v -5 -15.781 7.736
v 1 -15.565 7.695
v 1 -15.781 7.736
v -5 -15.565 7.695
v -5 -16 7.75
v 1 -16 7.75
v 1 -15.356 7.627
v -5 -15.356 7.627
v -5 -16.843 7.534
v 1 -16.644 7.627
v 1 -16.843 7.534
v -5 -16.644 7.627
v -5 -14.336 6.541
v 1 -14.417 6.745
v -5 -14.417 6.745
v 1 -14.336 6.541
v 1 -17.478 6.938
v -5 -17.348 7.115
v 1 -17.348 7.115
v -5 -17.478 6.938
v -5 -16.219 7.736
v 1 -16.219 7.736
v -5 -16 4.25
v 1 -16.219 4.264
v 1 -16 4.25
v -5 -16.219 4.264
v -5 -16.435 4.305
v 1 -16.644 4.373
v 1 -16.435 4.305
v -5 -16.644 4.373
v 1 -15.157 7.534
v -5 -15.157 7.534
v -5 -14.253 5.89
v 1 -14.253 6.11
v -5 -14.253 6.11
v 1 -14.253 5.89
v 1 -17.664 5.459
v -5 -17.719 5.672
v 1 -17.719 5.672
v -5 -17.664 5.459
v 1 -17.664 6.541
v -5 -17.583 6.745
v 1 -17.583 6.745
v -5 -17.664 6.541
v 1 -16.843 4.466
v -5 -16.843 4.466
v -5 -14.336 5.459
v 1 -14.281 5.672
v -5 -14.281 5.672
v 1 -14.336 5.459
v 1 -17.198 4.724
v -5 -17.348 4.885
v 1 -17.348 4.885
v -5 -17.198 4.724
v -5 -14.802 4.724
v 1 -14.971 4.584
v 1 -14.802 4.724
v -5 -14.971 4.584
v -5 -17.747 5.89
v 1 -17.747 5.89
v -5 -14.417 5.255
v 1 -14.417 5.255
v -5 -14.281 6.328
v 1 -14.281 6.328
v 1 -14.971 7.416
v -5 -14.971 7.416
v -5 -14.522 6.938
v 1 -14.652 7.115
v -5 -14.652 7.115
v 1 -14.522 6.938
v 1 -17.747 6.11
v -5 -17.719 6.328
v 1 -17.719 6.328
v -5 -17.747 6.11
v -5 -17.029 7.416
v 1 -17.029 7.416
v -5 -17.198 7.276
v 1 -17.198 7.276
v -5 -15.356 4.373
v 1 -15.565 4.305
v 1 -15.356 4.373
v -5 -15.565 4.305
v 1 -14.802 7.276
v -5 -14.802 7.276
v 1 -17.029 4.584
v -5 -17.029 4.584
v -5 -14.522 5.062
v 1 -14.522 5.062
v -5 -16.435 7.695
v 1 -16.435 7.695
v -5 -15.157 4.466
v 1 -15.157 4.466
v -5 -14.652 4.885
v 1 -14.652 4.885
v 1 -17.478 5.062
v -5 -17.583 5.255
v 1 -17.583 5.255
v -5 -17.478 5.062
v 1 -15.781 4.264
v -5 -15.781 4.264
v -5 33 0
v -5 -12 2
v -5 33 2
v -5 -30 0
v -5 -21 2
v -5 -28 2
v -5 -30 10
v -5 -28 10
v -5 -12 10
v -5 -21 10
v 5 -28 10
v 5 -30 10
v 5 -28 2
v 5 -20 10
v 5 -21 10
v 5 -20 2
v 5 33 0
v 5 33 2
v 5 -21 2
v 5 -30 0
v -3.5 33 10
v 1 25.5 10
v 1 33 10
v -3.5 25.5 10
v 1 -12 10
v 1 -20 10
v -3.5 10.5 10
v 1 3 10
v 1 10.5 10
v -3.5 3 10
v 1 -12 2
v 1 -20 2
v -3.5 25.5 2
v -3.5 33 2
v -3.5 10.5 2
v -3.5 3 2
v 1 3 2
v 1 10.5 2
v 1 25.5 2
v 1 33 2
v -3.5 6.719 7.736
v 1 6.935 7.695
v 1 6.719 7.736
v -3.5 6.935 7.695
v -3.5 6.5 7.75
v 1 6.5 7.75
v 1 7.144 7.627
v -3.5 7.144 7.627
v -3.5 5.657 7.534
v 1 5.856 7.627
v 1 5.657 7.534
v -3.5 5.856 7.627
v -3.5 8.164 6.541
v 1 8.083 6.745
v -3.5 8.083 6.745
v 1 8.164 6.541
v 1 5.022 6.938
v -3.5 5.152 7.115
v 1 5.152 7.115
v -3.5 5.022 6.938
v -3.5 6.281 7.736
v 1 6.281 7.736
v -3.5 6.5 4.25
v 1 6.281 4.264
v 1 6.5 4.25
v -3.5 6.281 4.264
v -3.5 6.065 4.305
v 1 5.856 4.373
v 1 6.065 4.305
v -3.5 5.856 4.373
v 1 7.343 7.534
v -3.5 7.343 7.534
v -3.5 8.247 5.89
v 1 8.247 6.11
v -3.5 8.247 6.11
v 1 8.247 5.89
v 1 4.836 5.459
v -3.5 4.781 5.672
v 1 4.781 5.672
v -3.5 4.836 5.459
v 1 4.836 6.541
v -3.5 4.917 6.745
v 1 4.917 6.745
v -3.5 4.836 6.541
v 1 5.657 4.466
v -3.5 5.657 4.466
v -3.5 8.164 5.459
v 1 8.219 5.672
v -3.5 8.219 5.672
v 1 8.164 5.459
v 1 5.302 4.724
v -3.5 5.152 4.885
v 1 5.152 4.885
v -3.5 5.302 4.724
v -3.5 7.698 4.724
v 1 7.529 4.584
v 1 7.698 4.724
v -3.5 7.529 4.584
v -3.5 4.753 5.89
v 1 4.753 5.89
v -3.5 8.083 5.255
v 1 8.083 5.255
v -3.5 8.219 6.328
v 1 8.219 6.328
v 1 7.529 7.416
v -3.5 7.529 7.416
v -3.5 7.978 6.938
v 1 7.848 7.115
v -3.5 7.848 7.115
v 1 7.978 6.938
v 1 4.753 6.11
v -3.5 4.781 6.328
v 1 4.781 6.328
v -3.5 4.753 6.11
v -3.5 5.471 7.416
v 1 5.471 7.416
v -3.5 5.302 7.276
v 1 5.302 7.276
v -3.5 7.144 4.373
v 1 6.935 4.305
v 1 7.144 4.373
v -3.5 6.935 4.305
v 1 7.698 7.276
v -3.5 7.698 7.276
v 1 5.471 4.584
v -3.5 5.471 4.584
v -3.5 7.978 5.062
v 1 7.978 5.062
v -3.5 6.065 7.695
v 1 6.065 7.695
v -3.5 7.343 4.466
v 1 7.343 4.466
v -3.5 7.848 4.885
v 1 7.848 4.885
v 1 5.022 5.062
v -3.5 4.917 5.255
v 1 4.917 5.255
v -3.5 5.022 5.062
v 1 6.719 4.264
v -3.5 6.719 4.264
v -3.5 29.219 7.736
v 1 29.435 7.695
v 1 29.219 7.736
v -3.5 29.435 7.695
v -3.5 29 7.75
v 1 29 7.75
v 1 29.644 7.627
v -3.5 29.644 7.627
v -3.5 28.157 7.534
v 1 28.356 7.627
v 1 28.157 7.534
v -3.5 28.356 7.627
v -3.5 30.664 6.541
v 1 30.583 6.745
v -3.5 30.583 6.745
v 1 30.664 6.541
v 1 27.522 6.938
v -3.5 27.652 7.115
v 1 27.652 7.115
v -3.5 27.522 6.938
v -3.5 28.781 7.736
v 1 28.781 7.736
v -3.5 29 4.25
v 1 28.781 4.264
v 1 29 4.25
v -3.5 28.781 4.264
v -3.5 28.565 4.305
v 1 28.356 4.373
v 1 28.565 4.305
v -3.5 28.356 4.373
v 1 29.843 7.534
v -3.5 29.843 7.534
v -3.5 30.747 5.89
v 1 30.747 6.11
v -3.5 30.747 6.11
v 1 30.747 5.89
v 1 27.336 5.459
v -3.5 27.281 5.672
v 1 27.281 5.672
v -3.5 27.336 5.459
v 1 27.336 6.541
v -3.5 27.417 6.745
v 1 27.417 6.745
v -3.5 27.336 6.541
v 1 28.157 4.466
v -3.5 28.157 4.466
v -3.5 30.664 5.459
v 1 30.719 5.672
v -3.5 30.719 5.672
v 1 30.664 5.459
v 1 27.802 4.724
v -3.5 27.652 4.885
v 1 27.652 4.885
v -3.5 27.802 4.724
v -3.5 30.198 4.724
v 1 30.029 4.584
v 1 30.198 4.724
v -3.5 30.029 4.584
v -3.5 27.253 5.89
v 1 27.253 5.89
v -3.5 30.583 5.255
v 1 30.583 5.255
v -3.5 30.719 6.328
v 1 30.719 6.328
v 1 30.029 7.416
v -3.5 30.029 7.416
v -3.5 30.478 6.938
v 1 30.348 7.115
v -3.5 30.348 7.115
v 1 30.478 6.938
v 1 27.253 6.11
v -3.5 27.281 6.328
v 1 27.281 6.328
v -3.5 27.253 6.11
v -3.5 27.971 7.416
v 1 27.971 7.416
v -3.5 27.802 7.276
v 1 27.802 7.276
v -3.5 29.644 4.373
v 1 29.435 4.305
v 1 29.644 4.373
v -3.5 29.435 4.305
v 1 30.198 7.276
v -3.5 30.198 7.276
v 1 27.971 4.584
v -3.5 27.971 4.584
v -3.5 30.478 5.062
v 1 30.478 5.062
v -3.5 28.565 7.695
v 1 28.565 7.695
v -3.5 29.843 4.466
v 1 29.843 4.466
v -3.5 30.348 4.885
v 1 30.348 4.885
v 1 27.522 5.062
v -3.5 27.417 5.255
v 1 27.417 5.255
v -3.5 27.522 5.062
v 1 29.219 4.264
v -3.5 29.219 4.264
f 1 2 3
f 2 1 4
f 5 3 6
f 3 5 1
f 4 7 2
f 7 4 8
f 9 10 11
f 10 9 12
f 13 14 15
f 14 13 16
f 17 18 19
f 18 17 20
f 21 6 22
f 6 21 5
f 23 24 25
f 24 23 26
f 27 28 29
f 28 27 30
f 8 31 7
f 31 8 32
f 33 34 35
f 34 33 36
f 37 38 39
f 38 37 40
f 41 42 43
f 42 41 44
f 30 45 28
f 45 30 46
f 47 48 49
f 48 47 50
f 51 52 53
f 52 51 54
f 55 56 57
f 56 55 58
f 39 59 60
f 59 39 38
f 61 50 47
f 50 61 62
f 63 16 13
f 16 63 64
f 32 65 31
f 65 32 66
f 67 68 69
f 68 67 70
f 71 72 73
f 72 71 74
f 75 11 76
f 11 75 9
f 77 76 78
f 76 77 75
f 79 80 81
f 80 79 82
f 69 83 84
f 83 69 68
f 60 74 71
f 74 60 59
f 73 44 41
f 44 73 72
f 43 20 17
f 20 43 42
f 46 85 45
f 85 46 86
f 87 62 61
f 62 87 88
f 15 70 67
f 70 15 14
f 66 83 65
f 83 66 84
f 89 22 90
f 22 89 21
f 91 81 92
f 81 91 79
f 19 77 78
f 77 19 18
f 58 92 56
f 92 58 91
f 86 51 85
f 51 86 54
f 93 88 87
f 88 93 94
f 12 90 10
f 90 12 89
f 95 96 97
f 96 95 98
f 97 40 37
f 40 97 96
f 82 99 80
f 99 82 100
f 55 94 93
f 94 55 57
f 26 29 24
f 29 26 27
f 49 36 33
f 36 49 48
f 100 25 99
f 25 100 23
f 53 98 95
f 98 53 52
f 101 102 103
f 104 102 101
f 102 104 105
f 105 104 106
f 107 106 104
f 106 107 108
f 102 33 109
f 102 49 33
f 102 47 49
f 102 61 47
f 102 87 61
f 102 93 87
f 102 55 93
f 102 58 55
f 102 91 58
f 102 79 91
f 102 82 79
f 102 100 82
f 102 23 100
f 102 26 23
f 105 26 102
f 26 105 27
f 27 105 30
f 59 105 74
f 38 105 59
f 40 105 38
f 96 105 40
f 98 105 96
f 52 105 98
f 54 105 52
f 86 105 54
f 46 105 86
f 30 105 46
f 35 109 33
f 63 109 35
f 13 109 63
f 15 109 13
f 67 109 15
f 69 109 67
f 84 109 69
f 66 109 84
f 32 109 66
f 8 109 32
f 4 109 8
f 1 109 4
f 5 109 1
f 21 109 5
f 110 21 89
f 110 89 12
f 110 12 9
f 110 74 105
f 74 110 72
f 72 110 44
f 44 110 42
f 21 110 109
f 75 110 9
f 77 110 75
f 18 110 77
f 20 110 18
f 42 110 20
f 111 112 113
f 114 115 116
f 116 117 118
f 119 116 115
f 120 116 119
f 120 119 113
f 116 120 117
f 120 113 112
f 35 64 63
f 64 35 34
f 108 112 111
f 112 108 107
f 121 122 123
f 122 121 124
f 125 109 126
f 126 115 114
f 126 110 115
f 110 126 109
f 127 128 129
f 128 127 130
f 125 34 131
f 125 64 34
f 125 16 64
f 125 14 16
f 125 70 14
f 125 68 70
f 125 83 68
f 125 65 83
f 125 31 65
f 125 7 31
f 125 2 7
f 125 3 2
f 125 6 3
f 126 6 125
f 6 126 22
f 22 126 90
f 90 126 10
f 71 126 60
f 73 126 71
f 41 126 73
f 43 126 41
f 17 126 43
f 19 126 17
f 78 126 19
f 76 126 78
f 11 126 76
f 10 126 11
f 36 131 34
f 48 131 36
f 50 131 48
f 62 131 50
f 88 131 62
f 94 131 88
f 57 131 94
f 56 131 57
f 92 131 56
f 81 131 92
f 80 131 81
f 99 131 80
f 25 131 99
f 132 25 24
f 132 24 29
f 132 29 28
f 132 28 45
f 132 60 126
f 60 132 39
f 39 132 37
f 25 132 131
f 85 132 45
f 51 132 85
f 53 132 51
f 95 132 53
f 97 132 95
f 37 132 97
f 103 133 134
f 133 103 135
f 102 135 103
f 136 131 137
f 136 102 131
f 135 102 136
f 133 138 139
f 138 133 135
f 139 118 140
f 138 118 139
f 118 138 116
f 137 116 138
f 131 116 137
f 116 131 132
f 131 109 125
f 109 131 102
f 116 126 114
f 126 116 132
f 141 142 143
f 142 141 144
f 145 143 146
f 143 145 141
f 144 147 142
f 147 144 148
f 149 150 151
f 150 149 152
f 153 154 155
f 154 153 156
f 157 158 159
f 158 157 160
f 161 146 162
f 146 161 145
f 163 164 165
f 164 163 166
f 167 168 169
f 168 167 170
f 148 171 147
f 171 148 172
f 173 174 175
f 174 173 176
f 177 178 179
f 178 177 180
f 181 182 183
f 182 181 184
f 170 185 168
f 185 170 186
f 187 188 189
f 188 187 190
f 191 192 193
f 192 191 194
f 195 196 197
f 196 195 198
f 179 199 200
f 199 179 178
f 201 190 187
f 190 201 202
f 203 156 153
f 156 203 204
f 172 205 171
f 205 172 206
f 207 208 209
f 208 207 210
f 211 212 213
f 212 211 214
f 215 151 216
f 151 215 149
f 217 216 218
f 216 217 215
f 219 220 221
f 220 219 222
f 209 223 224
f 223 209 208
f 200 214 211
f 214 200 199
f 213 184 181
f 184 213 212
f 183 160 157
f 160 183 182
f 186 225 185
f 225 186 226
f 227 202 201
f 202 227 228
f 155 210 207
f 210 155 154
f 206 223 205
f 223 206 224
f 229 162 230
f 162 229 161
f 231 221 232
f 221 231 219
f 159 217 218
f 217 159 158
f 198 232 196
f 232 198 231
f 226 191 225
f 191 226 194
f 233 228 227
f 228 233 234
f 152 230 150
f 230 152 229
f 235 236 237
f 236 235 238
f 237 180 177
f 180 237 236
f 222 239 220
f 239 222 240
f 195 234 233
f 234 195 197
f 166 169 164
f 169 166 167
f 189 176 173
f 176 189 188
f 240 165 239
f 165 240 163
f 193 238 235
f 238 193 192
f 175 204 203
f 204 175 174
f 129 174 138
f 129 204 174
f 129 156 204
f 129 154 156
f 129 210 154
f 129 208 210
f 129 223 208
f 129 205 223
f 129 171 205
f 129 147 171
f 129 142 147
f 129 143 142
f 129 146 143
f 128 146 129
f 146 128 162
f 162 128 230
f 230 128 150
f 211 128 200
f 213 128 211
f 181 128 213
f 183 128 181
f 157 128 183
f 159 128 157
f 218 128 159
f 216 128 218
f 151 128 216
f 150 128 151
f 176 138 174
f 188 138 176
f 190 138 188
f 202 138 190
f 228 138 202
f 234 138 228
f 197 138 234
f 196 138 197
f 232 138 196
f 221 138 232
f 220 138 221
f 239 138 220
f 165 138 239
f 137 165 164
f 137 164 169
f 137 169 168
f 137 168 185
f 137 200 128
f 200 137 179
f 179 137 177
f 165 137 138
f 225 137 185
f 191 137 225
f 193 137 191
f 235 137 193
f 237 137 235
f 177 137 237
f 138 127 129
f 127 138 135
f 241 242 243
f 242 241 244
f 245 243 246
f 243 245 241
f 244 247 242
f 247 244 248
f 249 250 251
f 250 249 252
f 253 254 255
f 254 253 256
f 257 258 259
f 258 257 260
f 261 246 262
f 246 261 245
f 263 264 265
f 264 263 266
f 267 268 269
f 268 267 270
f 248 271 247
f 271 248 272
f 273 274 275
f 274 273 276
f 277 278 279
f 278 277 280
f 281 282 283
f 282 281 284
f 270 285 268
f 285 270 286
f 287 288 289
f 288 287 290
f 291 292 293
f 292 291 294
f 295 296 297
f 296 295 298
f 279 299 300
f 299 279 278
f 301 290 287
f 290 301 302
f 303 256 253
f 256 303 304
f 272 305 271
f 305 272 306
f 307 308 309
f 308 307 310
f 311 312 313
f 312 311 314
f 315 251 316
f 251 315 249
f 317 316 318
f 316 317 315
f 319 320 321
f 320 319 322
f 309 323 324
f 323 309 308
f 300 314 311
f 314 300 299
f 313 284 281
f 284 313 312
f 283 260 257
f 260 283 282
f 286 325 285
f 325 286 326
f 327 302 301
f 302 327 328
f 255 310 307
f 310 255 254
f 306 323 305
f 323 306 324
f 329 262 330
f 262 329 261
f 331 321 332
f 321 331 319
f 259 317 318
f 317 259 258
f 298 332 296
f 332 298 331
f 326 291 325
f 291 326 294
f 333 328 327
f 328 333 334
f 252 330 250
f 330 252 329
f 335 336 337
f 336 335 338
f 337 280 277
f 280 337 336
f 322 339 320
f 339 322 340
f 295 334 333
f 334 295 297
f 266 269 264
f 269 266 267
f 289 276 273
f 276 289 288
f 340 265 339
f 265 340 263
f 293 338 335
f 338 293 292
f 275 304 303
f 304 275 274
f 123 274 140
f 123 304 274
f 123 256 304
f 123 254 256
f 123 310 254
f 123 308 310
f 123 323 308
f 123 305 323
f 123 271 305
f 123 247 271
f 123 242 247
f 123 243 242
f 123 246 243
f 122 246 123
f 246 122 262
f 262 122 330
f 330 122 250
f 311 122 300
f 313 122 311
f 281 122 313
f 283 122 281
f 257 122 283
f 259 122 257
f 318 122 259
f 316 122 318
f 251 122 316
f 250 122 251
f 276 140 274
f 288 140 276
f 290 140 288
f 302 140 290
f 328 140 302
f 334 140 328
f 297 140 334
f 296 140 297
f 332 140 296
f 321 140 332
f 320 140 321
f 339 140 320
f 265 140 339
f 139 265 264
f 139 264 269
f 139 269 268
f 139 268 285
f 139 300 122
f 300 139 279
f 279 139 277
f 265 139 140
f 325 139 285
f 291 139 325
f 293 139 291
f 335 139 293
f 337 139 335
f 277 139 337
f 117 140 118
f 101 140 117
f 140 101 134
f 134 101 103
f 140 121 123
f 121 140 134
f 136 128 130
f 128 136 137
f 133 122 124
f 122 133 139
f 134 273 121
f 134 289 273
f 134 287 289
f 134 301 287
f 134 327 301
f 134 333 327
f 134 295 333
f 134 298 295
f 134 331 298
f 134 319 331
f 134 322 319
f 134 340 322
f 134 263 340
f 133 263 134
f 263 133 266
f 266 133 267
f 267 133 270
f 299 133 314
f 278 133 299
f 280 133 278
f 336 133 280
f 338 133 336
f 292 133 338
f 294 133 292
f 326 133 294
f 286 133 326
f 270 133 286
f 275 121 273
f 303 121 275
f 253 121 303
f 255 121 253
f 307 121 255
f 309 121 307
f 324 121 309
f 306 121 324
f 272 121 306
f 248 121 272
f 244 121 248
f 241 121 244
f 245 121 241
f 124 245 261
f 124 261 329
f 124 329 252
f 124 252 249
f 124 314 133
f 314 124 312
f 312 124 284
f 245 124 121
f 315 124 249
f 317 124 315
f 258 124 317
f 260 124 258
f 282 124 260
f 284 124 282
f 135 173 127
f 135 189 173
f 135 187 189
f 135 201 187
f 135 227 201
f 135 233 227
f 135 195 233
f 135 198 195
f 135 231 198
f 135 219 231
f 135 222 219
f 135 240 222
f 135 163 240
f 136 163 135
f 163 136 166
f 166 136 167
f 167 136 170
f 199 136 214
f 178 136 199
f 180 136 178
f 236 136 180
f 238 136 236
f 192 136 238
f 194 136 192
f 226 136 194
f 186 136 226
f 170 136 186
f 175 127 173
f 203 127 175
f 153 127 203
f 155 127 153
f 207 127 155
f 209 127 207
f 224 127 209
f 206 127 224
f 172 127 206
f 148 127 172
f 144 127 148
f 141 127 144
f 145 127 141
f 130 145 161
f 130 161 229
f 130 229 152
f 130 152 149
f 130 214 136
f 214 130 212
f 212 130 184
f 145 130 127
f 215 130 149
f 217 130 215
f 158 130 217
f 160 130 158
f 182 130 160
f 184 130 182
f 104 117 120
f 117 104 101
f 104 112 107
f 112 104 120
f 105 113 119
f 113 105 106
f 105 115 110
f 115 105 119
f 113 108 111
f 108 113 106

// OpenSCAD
WIDTH = 10;
LENGTH = 63;
THICKNESS = 10;
BODY_OFFSET_Y = 1.5;

MOUNT_HOLE_SPACING = 22.5;
MOUNT_HOLE_OFFSET_Y = -16;
MOUNT_HOLE_OFFSET_Z = 6;

MOUNT_HOLES = 3;
MOUNT_HOLE_DIA = 3.5;
MOUNT_HOLE_HEAD_DIA = 8;
MOUNT_HOLE_HEAD_LENGTH = 4;

PORTS = 2;
PORT_WIDTH = 9;
PORT_LENGTH = 15;
PORT_MOUNT_WIDTH = 9;
PORT_MOUNT_LENGTH = 36;
PORT_MOUNT_OFFSET = 8.5;

PORT_SPACING = MOUNT_HOLE_SPACING;
PORT_OFFSET_Y = -4.5;
PORT_OFFSET_Z = 2;
PORT_OFFSETS_X = [-1.5, 0];

AUDIO_WIDTH = 9;
AUDIO_LENGTH = 7;
AUDIO_OFFSET_Y = -24.5;
AUDIO_OFFSET_Z = PORT_OFFSET_Z;

$fn = 50;

module body() {
  translate([-WIDTH/2, -LENGTH/2 + BODY_OFFSET_Y, 0])
  cube(size = [WIDTH, LENGTH, THICKNESS]);
}

module mount_hole() {
  union() {
    cylinder(d = MOUNT_HOLE_DIA, h = WIDTH);
    translate([-MOUNT_HOLE_HEAD_DIA/2, -MOUNT_HOLE_HEAD_DIA/2, 0])
    cube(size = [MOUNT_HOLE_HEAD_DIA, MOUNT_HOLE_HEAD_DIA, MOUNT_HOLE_HEAD_LENGTH]);
  }
}

module port() {
  union() {
    translate([-WIDTH/2, -PORT_LENGTH/2, 0])
    cube(size = [WIDTH * 1.5, PORT_LENGTH, PORT_WIDTH]);

    translate([-WIDTH/2, -PORT_MOUNT_LENGTH/2, 0])
    cube(size = [WIDTH - PORT_MOUNT_OFFSET, PORT_MOUNT_LENGTH, PORT_MOUNT_WIDTH]);
  }
}

module audio() {
  translate([-WIDTH/2, -AUDIO_LENGTH/2, 0])
  cube(size = [WIDTH, AUDIO_LENGTH, AUDIO_WIDTH]);
}

difference() {
  body();

  #for(i = [0:MOUNT_HOLES-1]) {
    translate([WIDTH/2, MOUNT_HOLE_OFFSET_Y + i * MOUNT_HOLE_SPACING, MOUNT_HOLE_OFFSET_Z])
    rotate([0, -90, 0])
    mount_hole();
  }

  #for(i = [0:PORTS-1]) {
    translate([PORT_OFFSETS_X[i], PORT_OFFSET_Y + i * PORT_SPACING, PORT_OFFSET_Z])
    port();
  }

  #translate([0, AUDIO_OFFSET_Y, AUDIO_OFFSET_Z])
  audio();
}
